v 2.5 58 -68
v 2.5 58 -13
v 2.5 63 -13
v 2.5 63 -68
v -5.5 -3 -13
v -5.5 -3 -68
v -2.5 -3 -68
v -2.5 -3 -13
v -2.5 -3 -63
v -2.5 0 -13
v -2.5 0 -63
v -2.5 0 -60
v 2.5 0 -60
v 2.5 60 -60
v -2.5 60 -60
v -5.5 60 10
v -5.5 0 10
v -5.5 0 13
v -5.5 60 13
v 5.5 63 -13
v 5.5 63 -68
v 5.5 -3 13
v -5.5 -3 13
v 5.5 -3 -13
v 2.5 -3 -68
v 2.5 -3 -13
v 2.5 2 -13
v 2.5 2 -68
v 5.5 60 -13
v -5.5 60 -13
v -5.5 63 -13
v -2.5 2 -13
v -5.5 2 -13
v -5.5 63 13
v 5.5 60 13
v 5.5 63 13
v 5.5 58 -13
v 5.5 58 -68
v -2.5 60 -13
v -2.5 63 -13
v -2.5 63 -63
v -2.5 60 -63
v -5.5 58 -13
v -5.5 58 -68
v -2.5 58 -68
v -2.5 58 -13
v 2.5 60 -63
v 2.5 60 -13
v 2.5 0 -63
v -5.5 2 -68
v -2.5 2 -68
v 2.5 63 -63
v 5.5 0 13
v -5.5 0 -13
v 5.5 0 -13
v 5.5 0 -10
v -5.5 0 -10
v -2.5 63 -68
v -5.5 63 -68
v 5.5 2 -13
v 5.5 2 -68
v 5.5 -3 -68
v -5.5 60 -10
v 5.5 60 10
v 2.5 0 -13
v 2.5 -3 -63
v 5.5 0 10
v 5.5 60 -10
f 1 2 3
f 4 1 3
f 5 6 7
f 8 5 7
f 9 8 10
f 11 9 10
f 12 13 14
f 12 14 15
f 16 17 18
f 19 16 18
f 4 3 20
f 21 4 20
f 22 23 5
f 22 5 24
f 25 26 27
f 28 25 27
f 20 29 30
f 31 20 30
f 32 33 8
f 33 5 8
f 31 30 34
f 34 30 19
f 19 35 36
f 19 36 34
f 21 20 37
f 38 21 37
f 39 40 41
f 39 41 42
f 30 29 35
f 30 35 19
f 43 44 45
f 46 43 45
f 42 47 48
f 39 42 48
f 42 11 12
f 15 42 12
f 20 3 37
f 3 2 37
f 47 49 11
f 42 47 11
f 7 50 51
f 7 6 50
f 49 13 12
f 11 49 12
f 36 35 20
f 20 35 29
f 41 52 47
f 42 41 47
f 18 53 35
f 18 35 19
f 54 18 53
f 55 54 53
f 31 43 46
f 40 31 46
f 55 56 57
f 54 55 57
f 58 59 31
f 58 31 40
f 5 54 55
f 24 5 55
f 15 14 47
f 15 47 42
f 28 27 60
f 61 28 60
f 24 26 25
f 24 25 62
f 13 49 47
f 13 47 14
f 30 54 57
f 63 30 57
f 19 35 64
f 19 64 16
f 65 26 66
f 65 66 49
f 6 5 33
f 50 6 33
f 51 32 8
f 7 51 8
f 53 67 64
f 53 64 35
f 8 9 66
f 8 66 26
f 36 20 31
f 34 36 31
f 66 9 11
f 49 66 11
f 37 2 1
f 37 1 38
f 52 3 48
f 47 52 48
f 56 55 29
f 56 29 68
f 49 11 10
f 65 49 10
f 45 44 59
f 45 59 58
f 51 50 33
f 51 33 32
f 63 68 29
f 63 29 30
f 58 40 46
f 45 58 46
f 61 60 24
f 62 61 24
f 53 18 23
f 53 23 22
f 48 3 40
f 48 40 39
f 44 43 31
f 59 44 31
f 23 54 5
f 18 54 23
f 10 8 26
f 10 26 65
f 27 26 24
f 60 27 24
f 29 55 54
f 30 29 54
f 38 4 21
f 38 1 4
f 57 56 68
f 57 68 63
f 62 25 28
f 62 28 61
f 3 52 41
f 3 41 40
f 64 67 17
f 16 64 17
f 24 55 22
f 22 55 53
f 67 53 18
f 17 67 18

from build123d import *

# Parameters (mm, degrees)
F0_W      = 11
F0_H      = 26
F1_DEPTH  = 3
F2_W      = 11
F2_H      = 3
F3_DEPTH  = 60
F4_W      = 11
F4_H      = 3
F4_H_2    = 23
F5_DEPTH  = 3
F6_W      = 3
F6_H      = 2
F6_H_2    = 3
F7_DEPTH  = 55
F8_W      = 3
F8_H      = 50
F9_DEPTH  = 5
F10_W     = 3
F10_H     = 3
F10_H_2   = 2
F11_DEPTH = 55
F13_W     = 5
F13_H     = 3
F14_DEPTH = 60
F12_W     = 3
F12_H     = 50
F15_DEPTH = 5


with BuildPart() as f1:
    # F0 (on Front) → F1 (new body)
    with BuildSketch(Plane.XZ):
        Rectangle(F0_W, F0_H)
    extrude(amount=F1_DEPTH)


with BuildPart() as f3:
    # F2 (on face) → F3 (new body)
    with BuildSketch(Plane(origin=(0, 0, 0), x_dir=(-1, 0, 0), z_dir=(0, 1, 0))):
        with Locations((0, 11.5)):
            Rectangle(F2_W, F2_H)
    extrude(amount=F3_DEPTH)


with BuildPart() as f3b:
    # F2 (on face) → F3, piece 2 (new body)
    with BuildSketch(Plane(origin=(0, 0, 0), x_dir=(-1, 0, 0), z_dir=(0, 1, 0))):
        with Locations((0, -11.5)):
            Rectangle(F2_W, F2_H)
    extrude(amount=F3_DEPTH)


with BuildPart() as f5:
    # F4 (on face) → F5 (new body)
    with BuildSketch(Plane(origin=(0, 60, 0), x_dir=(-1, 0, 0), z_dir=(0, 1, 0))):
        with Locations((0, 11.5)):
            Rectangle(F4_W, F4_H)
        with Locations((0, -1.5)):
            Rectangle(F4_W, F4_H_2)
    extrude(amount=F5_DEPTH)


with BuildPart() as f7:
    # F6 (on face) → F7 (new body)
    with BuildSketch(Plane(origin=(0, 0, -13), x_dir=(1, 0, 0), z_dir=(0, 0, -1))):
        with Locations((-4, -1)):
            Rectangle(F6_W, F6_H)
        with Locations((-4, 1.5)):
            Rectangle(F6_W, F6_H_2)
    extrude(amount=F7_DEPTH)


with BuildPart() as f7b:
    # F6 (on face) → F7, piece 2 (new body)
    with BuildSketch(Plane(origin=(0, 0, -13), x_dir=(1, 0, 0), z_dir=(0, 0, -1))):
        with Locations((4, 1.5)):
            Rectangle(F6_W, F6_H_2)
        with Locations((4, -1)):
            Rectangle(F6_W, F6_H)
    extrude(amount=F7_DEPTH)


with BuildPart() as f9:
    # F8 (on face) → F9 (new body)
    with BuildSketch(Plane.YZ.offset(-2.5)):
        with Locations((-1.5, -38)):
            Rectangle(F8_W, F8_H)
    extrude(amount=F9_DEPTH)


with BuildPart() as f11:
    # F10 (on face) → F11 (new body)
    with BuildSketch(Plane(origin=(0, 0, -13), x_dir=(1, 0, 0), z_dir=(0, 0, -1))):
        with Locations((4, -61.5)):
            Rectangle(F10_W, F10_H)
        with Locations((4, -59)):
            Rectangle(F10_W, F10_H_2)
    extrude(amount=F11_DEPTH)


with BuildPart() as f11b:
    # F10 (on face) → F11, piece 2 (new body)
    with BuildSketch(Plane(origin=(0, 0, -13), x_dir=(1, 0, 0), z_dir=(0, 0, -1))):
        with Locations((-4, -59)):
            Rectangle(F10_W, F10_H_2)
        with Locations((-4, -61.5)):
            Rectangle(F10_W, F10_H)
    extrude(amount=F11_DEPTH)


with BuildPart() as f14:
    # F13 (on face) → F14 (new body)
    with BuildSketch(Plane(origin=(0, 0, 0), x_dir=(-1, 0, 0), z_dir=(0, 1, 0))):
        with Locations((0, -61.5)):
            Rectangle(F13_W, F13_H)
    extrude(amount=F14_DEPTH)


with BuildPart() as f15:
    # F12 (on face) → F15 (new body)
    with BuildSketch(Plane(origin=(2.5, 0, 0), x_dir=(0, -1, 0), z_dir=(-1, 0, 0))):
        with Locations((-61.5, -38)):
            Rectangle(F12_W, F12_H)
    extrude(amount=F15_DEPTH)


solid = Compound([f1.part, f3.part, f3b.part, f5.part, f7.part, f7b.part, f9.part, f11.part, f11b.part, f14.part, f15.part])
